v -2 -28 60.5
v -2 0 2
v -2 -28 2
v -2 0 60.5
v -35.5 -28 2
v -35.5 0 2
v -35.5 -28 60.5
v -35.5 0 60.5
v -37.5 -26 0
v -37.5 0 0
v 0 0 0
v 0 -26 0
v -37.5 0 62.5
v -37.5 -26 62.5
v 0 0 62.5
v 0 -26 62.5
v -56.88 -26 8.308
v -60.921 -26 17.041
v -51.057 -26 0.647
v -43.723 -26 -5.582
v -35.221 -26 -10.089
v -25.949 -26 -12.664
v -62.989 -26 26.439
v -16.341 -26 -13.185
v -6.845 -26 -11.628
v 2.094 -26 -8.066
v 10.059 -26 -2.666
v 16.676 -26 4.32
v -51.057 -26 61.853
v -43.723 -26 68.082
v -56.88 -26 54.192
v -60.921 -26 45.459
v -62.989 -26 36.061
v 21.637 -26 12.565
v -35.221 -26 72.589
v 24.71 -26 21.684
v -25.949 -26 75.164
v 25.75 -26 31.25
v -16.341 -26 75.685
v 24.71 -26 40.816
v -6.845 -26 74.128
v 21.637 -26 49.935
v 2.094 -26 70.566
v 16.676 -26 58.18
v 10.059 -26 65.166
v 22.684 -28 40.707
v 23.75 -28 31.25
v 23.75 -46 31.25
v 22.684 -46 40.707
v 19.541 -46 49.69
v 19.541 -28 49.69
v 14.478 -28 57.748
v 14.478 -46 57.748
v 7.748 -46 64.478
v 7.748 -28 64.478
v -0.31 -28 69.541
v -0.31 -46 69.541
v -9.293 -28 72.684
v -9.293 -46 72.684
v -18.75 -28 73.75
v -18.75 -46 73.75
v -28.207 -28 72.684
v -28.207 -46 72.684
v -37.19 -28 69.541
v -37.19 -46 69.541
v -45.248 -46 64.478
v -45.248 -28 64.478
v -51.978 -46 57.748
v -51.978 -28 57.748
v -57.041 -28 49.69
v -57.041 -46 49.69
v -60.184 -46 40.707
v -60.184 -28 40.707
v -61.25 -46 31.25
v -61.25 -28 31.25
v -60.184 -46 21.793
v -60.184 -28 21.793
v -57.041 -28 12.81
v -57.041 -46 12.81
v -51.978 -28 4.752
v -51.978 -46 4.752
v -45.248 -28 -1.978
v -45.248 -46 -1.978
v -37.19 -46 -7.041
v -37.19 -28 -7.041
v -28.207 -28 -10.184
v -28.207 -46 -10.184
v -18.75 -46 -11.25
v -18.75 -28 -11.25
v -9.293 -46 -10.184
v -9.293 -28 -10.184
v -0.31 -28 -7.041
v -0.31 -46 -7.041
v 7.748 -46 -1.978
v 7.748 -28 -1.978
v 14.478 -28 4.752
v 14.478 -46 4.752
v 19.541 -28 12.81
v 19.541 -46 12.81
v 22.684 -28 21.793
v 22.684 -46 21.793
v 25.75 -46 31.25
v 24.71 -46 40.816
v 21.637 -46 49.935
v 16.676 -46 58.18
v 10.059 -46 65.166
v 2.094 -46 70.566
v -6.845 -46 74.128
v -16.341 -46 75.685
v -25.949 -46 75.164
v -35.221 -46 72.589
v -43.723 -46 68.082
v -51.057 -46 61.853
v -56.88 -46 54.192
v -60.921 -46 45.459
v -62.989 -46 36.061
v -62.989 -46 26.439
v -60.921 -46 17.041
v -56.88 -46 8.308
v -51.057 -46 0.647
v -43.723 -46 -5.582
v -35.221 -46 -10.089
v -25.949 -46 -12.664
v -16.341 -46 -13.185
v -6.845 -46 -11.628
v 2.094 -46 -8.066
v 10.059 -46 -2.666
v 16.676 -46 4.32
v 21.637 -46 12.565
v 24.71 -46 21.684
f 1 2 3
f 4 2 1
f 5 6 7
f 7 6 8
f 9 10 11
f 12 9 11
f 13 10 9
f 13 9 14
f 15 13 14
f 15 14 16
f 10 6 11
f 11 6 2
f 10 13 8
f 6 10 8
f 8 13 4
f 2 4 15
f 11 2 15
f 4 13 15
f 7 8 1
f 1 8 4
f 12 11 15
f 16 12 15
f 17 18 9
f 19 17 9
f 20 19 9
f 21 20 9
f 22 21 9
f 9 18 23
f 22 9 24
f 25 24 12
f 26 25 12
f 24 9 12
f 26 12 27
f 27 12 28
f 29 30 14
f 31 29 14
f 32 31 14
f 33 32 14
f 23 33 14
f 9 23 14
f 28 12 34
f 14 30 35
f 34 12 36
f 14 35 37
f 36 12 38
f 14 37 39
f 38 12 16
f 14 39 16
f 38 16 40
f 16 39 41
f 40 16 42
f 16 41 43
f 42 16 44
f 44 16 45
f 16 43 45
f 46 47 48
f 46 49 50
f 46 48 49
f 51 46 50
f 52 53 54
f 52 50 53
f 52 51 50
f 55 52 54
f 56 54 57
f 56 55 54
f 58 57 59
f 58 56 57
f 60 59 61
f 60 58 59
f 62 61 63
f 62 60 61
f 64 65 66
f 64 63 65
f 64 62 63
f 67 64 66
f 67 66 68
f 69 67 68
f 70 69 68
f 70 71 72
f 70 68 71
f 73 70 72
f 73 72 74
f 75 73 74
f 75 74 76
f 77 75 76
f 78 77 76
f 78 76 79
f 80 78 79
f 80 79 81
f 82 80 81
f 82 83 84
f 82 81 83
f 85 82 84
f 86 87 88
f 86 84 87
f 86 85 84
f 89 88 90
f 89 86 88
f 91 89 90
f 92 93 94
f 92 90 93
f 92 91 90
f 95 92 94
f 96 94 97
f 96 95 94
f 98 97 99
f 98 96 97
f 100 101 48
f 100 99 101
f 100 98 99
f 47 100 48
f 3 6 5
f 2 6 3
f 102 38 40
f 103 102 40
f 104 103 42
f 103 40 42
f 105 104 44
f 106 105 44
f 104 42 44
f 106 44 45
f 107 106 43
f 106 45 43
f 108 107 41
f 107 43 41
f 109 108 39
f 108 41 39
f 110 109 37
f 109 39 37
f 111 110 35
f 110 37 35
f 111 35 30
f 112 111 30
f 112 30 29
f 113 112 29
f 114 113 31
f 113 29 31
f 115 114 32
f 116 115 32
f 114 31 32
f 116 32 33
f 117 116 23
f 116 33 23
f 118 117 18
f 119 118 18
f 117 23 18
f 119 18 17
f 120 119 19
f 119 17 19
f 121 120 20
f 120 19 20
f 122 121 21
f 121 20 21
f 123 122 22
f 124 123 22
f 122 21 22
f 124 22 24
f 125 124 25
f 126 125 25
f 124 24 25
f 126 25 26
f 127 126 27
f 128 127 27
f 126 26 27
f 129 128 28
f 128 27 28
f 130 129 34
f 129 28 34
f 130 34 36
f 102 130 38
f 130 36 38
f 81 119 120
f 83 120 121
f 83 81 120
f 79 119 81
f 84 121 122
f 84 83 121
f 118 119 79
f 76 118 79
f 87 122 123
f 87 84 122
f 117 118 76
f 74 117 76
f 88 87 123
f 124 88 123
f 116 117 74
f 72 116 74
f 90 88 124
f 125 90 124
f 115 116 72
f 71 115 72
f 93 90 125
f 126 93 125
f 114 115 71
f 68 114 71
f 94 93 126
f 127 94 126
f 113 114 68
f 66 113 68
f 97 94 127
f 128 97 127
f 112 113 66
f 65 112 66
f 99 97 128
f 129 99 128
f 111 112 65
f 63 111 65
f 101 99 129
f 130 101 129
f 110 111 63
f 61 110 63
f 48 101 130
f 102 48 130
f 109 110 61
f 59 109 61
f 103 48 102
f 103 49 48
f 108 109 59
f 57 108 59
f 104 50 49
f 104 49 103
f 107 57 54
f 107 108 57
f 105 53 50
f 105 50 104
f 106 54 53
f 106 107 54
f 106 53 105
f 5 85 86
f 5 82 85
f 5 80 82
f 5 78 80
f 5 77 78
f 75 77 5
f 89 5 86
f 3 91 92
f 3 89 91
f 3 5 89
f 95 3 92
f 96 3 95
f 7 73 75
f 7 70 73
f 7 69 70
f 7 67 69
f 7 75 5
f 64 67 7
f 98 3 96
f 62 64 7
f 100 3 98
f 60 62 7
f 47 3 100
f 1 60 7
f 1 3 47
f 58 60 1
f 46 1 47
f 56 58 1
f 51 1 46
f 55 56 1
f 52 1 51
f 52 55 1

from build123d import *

# Parameters (mm, degrees)
F0_W     = 37.5
F0_H     = 62.5
F1_DEPTH = 26
F2_R     = 44.5
F2_W     = 37.5
F2_H     = 62.5
F3_DEPTH = 20
F4_T     = -2


with BuildPart() as f1:
    # F0 (on Front) → F1 (new body)
    with BuildSketch(Plane.XZ):
        with Locations((-18.75, 31.25)):
            Rectangle(F0_W, F0_H)
    extrude(amount=F1_DEPTH)

    # F2 (on face) → F3 (join)
    with BuildSketch(Plane.XZ.offset(26)):
        with Locations((-18.75, 31.25)):
            Circle(F2_R)
        with Locations((-18.75, 31.25)):
            Rectangle(F2_W, F2_H, mode=Mode.SUBTRACT)
        with Locations((-18.75, 31.25)):
            Rectangle(F2_W, F2_H)
    extrude(amount=F3_DEPTH)

    # F4
    f4_openings = [f1.faces().sort_by_distance(p)[0] for p in [
        (-18.75, -46, 31.25),
        (-18.75, 0, 31.25),
    ]]
    offset(amount=F4_T, openings=f4_openings, kind=Kind.INTERSECTION)


solid = f1.part
